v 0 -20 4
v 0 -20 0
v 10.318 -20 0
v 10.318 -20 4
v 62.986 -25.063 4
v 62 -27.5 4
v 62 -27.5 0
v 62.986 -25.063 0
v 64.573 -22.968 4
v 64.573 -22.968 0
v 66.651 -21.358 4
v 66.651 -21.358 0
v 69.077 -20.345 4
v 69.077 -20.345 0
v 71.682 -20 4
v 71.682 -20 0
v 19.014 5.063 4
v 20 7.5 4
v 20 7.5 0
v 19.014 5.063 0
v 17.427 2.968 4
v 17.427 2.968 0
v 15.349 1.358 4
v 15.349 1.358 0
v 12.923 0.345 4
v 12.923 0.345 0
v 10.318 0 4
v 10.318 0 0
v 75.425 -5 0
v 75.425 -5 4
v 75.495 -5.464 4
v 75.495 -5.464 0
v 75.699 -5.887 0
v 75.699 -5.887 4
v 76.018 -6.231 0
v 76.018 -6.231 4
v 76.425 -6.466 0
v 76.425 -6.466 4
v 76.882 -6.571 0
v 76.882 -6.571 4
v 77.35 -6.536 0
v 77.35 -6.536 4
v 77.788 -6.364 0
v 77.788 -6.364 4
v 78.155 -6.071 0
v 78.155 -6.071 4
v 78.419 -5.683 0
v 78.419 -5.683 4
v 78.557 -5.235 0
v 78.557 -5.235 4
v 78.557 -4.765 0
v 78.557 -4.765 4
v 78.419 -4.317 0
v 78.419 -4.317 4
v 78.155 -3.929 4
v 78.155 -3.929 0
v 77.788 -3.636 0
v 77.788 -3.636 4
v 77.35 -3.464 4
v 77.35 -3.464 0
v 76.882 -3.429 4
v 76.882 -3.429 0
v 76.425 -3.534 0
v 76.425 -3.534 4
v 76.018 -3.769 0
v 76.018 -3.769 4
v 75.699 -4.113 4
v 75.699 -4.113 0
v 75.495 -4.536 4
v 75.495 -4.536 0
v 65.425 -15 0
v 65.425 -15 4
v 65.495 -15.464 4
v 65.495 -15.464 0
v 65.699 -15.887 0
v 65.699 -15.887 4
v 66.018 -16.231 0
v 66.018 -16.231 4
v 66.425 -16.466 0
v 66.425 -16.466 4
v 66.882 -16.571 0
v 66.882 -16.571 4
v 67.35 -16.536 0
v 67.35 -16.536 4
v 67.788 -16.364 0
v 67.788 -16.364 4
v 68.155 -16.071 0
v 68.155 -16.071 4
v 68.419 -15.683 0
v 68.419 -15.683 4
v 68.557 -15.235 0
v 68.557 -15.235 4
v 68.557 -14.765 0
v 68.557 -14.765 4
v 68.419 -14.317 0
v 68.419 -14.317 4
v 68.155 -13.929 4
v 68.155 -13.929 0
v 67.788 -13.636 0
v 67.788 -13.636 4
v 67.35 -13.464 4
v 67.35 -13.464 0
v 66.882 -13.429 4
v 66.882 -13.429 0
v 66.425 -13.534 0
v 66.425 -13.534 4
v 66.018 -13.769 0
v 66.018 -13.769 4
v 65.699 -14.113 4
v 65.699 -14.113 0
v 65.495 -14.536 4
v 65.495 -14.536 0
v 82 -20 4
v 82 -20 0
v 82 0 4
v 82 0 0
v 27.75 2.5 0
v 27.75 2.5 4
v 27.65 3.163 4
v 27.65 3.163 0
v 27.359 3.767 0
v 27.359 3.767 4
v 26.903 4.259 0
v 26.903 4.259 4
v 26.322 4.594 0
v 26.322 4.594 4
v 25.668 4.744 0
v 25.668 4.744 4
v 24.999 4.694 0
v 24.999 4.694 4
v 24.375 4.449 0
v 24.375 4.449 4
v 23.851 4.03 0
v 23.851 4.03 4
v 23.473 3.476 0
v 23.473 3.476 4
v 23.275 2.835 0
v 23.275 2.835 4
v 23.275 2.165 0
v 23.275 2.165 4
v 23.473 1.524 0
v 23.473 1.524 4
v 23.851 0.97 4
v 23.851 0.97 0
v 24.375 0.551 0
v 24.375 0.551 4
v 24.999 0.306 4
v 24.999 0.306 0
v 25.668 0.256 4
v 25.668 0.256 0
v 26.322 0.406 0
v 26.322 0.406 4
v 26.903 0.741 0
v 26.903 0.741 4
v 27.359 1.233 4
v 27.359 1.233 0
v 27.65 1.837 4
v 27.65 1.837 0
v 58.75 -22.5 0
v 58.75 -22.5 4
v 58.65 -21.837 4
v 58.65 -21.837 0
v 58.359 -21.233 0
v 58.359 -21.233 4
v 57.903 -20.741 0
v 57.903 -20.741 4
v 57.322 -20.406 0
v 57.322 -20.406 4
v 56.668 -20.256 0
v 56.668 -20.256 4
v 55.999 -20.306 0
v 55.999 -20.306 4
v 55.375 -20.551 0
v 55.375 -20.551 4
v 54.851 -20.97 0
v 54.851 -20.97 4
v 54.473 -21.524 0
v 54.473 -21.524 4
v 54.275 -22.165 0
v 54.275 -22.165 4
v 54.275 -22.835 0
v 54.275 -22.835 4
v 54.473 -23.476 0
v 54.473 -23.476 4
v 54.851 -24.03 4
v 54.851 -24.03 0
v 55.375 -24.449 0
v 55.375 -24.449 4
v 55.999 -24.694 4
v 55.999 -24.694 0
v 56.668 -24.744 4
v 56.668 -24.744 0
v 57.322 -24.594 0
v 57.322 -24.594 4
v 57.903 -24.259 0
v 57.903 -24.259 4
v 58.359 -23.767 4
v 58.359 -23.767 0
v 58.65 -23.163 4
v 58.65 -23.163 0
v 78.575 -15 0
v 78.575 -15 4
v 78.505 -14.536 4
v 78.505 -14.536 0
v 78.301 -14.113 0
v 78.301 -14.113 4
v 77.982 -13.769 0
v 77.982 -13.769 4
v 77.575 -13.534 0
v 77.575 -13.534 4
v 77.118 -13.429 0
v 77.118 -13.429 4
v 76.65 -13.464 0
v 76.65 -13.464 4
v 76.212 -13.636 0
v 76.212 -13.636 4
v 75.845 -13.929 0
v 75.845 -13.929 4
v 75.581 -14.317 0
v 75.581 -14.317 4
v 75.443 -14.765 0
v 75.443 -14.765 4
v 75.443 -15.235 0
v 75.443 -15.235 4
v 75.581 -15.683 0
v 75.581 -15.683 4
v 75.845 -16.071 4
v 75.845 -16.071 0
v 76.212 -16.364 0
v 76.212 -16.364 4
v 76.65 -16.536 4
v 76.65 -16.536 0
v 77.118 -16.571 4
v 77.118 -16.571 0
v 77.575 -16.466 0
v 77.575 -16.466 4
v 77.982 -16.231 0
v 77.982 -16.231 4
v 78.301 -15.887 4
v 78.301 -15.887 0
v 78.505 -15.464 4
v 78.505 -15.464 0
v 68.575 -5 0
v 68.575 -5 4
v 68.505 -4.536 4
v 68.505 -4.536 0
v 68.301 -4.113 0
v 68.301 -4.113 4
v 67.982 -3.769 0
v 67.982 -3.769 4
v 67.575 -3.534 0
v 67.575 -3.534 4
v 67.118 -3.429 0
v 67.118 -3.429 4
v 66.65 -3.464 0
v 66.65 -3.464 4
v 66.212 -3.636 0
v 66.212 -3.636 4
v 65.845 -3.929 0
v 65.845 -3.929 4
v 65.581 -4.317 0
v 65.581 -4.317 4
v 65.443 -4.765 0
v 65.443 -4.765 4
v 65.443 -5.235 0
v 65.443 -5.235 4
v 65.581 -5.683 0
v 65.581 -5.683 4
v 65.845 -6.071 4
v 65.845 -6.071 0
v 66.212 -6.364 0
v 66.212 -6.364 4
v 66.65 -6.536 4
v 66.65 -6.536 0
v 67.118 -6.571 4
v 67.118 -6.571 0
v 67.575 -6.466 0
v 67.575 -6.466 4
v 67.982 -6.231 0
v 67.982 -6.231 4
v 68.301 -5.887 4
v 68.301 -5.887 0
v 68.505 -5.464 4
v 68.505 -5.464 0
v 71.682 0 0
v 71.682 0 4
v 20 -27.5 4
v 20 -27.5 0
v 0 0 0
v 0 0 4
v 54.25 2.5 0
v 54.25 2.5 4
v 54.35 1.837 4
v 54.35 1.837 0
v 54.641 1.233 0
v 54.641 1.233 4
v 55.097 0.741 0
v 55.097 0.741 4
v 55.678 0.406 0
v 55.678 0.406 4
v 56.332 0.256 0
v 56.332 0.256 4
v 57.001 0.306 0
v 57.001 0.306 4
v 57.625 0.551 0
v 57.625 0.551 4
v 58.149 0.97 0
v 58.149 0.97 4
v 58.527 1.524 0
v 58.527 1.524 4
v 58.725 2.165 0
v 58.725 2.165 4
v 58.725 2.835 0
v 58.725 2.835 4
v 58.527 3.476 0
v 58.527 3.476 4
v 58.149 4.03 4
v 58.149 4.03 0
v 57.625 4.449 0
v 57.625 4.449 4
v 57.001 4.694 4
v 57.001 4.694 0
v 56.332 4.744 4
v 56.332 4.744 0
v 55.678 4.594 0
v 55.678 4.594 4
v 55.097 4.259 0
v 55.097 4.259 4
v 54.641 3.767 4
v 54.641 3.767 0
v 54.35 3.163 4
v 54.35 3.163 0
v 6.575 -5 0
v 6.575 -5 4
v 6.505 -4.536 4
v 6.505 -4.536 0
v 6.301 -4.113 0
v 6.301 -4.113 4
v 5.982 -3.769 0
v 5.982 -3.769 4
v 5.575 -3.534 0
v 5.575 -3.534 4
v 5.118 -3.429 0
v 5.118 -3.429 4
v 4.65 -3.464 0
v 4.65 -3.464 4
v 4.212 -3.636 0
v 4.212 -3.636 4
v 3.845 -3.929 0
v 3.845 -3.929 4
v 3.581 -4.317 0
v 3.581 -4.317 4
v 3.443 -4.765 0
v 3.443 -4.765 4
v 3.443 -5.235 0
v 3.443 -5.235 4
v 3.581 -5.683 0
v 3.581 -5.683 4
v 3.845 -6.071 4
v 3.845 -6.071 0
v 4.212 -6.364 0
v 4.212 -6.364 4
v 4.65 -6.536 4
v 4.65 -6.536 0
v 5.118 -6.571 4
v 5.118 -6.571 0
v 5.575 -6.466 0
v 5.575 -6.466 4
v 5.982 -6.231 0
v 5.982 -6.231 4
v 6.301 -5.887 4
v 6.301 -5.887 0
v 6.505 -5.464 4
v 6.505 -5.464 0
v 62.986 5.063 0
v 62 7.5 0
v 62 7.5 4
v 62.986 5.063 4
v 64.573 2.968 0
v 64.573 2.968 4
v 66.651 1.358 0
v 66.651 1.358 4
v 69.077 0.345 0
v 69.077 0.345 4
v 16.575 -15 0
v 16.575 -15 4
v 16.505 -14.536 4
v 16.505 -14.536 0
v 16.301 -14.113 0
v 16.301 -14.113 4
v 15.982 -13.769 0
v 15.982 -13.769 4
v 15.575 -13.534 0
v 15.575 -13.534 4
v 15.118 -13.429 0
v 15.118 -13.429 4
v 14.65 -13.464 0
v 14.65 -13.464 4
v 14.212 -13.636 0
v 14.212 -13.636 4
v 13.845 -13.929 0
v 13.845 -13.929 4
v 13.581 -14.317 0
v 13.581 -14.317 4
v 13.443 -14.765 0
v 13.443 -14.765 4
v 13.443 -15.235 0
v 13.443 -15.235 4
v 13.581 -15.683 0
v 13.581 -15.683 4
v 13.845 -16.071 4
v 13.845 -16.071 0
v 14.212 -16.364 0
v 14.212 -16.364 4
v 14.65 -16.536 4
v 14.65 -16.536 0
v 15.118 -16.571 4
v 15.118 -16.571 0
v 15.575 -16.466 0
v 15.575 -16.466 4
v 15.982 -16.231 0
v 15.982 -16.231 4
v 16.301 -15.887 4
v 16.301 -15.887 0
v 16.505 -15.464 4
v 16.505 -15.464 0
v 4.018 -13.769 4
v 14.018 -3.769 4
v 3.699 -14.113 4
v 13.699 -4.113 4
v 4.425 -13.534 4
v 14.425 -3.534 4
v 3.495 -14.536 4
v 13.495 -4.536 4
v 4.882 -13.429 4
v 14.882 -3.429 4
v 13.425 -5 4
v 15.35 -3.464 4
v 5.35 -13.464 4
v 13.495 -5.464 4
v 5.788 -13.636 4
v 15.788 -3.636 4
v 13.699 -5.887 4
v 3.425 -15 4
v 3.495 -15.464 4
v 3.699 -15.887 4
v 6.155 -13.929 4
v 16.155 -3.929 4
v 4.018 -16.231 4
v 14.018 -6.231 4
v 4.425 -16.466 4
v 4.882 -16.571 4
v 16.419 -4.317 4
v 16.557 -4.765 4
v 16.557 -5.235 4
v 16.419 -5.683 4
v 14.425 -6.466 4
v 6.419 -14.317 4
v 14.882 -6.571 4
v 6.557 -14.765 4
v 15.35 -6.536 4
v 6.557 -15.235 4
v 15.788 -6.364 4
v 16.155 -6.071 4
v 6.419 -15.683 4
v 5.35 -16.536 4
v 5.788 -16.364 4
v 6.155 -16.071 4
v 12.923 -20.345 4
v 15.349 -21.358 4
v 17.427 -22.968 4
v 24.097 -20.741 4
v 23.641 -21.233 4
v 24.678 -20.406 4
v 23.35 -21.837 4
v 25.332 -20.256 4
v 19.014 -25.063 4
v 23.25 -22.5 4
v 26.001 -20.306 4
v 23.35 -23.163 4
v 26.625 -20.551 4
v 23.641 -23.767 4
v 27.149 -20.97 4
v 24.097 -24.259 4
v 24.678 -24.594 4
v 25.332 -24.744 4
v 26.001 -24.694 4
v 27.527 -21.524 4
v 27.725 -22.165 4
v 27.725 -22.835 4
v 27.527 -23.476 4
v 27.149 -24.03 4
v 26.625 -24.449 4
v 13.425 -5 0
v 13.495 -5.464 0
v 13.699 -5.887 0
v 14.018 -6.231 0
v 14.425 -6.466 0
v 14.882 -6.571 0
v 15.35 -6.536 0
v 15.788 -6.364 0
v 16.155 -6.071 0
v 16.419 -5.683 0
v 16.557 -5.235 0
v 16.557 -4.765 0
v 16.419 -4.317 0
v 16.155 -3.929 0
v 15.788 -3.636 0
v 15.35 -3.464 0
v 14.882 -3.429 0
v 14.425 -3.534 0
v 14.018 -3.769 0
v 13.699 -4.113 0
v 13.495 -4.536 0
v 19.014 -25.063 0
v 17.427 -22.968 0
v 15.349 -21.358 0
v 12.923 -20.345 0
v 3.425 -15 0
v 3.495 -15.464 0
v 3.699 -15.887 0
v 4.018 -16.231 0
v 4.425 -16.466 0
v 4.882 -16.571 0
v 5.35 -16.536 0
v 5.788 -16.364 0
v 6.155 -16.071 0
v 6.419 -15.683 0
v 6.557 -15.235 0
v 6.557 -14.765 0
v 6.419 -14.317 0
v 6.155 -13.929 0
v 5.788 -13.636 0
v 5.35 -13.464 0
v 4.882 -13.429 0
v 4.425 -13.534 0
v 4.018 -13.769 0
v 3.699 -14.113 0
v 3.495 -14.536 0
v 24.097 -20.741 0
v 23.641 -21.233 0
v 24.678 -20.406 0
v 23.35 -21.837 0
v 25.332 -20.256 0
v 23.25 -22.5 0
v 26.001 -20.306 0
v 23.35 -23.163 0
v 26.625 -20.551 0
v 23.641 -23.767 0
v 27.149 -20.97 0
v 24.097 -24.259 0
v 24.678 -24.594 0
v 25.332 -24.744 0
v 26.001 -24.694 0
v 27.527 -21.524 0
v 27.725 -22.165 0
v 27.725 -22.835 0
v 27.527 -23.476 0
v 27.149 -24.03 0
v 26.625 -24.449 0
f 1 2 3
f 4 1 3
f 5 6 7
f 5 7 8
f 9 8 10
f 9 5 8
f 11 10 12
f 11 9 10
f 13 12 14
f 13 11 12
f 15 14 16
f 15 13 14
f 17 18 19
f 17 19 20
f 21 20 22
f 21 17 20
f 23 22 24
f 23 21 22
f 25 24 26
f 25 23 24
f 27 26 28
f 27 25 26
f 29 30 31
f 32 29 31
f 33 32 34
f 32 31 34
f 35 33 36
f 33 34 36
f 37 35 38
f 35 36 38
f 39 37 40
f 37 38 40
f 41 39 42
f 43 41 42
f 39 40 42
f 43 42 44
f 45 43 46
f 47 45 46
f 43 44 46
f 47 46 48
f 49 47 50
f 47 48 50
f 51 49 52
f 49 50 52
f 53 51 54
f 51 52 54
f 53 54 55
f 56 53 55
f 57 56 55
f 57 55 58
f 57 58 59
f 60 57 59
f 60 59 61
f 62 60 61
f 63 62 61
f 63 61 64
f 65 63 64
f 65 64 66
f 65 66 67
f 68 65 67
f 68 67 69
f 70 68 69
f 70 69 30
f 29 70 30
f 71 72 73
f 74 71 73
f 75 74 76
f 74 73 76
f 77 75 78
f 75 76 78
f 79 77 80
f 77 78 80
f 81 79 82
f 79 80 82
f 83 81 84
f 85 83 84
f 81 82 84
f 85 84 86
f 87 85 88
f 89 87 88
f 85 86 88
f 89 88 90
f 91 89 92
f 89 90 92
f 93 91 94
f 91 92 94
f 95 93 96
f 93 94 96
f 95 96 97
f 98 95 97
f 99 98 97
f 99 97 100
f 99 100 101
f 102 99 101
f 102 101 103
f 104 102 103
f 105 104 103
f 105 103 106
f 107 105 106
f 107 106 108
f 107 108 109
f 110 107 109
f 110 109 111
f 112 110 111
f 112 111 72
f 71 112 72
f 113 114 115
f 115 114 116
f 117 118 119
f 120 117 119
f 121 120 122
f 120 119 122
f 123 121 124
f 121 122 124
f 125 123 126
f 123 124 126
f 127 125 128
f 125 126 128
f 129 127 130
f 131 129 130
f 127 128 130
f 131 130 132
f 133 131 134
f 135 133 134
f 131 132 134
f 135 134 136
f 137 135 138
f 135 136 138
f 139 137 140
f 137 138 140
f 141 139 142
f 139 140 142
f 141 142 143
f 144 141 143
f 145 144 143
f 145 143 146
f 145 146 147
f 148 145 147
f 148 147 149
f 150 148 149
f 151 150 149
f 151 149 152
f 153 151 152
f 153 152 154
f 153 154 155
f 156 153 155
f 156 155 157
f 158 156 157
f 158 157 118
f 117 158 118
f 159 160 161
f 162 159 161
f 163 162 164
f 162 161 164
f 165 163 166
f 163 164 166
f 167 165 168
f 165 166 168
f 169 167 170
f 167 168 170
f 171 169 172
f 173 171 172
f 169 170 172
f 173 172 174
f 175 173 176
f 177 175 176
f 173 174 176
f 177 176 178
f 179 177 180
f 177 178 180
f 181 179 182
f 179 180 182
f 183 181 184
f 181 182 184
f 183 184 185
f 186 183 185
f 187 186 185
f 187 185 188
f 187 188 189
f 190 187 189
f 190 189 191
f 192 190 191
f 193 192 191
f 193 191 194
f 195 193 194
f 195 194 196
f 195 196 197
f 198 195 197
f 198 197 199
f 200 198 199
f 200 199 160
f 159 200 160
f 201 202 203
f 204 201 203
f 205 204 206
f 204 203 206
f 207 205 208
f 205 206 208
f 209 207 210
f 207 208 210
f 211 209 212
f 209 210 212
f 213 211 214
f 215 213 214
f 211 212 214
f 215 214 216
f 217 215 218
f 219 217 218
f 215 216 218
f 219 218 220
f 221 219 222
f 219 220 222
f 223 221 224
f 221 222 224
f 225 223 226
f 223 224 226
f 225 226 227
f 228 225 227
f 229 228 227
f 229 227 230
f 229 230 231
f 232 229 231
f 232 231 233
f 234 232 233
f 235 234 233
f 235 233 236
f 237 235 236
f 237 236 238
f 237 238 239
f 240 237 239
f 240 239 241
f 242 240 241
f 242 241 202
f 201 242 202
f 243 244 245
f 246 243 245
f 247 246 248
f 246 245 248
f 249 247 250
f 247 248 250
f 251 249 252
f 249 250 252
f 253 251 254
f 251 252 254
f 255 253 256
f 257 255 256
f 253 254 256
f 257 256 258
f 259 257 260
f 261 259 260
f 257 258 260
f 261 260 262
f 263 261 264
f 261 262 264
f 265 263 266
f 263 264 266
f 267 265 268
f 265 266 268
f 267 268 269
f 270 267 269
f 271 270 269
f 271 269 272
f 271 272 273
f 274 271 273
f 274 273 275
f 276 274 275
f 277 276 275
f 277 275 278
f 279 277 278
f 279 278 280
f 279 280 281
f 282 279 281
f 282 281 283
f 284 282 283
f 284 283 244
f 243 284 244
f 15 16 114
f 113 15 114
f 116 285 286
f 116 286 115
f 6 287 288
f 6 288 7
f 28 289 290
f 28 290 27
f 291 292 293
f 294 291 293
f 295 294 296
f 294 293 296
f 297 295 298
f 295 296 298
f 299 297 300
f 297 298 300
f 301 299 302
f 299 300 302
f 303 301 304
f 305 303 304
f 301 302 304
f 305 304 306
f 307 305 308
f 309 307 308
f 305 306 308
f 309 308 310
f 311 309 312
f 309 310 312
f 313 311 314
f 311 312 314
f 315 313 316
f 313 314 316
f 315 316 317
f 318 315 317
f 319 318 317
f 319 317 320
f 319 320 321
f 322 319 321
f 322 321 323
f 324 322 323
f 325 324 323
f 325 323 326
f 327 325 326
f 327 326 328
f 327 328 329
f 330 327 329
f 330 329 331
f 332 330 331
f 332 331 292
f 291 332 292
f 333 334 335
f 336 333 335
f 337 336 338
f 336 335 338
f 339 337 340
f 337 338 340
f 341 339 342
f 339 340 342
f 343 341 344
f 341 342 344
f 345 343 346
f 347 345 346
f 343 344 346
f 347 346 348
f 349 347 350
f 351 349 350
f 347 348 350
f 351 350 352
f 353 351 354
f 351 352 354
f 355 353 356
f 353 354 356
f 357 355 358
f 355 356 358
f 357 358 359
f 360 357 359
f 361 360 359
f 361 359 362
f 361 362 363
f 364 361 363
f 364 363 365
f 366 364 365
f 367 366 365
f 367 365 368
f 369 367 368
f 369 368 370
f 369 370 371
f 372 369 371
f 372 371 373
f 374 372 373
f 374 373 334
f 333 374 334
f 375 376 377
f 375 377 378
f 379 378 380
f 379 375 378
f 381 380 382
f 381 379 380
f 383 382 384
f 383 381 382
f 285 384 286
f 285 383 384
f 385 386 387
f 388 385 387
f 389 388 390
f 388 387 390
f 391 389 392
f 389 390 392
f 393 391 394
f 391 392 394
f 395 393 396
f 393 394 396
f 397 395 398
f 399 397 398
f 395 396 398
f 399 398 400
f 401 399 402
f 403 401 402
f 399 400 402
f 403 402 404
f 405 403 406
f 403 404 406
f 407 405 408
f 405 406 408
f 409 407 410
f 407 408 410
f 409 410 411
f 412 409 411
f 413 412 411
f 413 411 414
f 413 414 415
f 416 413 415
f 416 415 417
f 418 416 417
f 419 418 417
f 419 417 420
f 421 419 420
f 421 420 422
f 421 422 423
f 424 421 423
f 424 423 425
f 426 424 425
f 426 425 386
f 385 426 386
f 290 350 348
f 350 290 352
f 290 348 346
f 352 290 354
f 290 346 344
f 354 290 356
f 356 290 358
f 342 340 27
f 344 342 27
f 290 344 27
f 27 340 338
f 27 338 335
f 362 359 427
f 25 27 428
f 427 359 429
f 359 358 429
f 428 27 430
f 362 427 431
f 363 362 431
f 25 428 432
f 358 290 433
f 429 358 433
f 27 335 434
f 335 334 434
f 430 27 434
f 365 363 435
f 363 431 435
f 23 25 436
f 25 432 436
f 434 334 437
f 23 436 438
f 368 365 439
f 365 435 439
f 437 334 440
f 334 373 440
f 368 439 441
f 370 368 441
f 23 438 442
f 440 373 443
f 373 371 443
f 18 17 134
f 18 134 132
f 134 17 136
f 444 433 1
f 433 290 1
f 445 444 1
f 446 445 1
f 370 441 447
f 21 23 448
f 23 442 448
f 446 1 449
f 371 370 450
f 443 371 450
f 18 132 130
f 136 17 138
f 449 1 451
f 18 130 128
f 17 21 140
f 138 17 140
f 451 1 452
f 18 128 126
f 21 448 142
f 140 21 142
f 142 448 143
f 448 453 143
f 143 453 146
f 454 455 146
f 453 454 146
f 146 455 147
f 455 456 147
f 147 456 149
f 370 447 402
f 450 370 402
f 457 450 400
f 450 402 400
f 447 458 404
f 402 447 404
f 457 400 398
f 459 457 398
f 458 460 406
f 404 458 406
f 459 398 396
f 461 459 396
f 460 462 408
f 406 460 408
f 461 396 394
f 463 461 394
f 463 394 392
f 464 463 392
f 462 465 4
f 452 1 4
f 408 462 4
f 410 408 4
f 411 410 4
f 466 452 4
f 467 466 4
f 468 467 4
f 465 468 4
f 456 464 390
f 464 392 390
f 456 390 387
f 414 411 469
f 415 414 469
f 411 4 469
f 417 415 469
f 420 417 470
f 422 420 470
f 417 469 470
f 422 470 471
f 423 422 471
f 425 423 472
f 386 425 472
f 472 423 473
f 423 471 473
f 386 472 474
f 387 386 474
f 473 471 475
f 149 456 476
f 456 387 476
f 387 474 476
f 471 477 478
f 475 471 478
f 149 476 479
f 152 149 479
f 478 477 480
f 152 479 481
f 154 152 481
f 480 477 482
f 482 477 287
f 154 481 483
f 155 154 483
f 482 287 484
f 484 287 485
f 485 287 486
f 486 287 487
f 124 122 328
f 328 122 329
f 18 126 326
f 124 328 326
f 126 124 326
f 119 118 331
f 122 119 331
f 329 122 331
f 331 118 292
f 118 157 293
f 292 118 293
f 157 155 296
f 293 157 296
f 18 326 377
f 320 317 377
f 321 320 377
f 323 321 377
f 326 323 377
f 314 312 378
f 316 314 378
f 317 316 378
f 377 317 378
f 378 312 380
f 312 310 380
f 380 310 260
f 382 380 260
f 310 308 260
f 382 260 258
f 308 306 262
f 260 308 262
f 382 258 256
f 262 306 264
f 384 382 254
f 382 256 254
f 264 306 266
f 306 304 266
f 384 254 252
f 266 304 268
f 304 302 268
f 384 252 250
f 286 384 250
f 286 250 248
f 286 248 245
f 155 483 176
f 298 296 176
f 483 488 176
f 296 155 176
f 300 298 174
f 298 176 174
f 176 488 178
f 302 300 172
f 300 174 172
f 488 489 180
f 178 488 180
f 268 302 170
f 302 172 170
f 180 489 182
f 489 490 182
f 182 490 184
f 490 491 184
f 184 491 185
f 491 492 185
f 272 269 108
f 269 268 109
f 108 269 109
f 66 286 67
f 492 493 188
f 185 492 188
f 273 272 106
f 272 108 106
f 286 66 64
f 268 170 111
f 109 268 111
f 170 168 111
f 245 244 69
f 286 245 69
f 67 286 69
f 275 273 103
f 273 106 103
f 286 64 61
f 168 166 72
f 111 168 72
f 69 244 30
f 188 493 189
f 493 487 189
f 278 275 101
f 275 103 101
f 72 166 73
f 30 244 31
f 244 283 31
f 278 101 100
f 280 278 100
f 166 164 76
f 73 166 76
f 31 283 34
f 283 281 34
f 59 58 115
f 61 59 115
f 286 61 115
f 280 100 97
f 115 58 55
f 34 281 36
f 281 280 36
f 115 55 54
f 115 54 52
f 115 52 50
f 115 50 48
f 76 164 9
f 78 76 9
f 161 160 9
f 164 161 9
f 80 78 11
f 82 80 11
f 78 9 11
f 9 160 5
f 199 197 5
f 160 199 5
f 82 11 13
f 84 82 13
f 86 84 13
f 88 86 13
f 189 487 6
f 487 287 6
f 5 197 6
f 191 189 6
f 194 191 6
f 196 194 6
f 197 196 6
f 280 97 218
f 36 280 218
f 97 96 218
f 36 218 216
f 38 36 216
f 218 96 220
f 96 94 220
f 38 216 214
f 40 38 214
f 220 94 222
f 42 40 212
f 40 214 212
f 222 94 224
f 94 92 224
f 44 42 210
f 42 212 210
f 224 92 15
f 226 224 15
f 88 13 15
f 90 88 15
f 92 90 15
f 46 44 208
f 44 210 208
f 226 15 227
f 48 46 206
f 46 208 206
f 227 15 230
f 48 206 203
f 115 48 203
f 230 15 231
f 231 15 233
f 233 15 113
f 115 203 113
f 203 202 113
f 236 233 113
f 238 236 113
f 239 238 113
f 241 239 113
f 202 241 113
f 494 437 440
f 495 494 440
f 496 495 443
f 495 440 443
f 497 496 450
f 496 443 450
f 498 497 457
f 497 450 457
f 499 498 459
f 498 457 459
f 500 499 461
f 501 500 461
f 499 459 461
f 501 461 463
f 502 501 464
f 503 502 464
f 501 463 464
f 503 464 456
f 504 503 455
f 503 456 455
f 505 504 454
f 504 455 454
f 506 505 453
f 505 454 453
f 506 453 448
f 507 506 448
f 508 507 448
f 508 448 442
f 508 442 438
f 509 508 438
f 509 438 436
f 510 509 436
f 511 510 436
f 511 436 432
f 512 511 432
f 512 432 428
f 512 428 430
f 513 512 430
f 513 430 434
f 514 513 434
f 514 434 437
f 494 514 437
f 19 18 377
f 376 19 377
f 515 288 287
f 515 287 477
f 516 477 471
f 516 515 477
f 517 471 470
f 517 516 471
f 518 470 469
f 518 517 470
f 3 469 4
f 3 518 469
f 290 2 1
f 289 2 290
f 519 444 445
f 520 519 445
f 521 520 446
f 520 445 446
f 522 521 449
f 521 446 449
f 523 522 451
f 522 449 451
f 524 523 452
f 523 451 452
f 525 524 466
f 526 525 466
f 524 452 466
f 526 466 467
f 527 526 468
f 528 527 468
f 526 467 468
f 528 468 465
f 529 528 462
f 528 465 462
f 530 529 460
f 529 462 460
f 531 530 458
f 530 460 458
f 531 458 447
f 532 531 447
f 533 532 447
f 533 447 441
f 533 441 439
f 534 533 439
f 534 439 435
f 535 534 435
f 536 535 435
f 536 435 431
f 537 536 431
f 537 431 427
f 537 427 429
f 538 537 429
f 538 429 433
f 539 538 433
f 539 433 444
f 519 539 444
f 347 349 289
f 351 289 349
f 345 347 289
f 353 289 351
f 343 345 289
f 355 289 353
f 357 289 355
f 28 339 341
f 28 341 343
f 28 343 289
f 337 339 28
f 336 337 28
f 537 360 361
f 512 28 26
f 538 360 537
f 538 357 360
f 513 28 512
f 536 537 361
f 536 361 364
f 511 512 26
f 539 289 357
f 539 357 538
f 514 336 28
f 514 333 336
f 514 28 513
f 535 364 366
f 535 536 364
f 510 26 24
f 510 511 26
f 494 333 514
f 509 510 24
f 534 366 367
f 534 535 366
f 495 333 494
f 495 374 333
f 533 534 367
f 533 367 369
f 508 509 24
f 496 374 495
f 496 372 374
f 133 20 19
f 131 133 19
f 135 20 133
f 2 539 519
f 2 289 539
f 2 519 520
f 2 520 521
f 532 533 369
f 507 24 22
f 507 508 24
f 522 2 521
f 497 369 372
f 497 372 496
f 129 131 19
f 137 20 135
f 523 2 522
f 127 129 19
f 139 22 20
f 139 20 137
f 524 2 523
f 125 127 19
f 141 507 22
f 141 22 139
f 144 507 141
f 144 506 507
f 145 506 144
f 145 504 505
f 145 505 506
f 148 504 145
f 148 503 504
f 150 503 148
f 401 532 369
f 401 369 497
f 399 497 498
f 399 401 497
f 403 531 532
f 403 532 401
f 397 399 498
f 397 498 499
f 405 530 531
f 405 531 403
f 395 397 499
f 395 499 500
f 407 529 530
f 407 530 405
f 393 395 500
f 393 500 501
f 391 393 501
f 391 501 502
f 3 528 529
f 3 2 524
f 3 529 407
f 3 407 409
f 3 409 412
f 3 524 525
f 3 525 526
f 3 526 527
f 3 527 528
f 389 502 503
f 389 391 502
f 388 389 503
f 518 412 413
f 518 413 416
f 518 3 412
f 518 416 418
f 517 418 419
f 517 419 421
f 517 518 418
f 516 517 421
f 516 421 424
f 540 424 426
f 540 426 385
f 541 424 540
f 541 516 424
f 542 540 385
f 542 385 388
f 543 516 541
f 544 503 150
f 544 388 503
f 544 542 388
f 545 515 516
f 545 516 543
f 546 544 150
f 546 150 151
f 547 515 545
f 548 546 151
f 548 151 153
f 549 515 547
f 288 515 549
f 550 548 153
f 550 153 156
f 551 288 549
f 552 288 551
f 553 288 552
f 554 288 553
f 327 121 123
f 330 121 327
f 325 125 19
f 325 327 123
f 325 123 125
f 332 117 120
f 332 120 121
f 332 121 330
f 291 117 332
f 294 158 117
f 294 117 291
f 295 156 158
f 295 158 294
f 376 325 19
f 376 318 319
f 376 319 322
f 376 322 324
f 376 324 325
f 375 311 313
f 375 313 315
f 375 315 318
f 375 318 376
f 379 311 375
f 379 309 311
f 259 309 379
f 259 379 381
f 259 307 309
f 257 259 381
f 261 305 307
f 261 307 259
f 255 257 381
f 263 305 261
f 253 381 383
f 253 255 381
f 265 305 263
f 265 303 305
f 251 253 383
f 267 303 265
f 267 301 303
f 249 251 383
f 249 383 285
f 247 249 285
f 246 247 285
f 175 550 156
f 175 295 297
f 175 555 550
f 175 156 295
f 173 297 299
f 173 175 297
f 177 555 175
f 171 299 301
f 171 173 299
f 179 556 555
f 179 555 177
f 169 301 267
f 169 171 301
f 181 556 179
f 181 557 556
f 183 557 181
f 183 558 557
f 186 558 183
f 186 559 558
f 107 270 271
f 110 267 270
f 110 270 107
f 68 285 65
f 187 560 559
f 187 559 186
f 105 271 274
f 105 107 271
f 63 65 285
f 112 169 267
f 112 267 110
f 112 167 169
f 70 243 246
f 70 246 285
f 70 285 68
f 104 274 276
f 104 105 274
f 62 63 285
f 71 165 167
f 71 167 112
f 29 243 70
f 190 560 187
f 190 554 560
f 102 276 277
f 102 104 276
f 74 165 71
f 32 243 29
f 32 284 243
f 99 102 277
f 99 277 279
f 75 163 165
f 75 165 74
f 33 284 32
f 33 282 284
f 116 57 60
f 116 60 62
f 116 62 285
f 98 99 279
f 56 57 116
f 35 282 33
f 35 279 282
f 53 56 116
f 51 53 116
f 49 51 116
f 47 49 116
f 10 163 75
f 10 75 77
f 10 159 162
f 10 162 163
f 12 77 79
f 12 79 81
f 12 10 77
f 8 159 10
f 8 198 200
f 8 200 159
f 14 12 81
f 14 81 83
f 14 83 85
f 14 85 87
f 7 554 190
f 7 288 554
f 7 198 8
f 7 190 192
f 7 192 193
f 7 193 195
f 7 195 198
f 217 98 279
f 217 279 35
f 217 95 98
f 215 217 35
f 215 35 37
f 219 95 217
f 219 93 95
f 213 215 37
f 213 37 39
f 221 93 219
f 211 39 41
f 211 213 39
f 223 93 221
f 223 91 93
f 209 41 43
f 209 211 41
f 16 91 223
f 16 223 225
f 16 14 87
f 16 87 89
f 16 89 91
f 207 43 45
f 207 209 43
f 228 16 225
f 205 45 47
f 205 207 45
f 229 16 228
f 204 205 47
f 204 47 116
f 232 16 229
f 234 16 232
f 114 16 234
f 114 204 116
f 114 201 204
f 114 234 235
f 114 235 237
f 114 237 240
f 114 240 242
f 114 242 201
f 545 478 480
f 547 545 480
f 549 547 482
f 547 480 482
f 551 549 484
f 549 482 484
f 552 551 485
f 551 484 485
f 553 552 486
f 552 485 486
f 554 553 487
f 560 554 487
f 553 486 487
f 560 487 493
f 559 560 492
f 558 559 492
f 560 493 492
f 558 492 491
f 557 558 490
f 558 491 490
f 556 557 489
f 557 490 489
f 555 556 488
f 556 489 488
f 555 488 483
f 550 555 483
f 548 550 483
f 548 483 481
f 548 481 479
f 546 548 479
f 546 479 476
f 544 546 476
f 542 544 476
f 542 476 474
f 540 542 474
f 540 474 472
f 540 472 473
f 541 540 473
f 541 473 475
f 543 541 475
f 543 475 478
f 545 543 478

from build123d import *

# Parameters (mm, degrees)
SKETCH_1_W          = 82
SKETCH_1_H          = 20
EXTRUDE_1_DEPTH     = 4
SKETCH_2_W          = 42
SKETCH_2_H          = 35
EXTRUDE_2_DEPTH     = 4
SKETCH_3_R          = 1.575
SKETCH_3_R_2        = 2.25
CUT_EXTRUDE_1_DEPTH = 87.580887036
FILLET_1_R          = 10


with BuildPart() as part:
    # 草图1 → 凸台-拉伸1 (new body)
    with BuildSketch(Plane.XY):
        with Locations((41, -10)):
            Rectangle(SKETCH_1_W, SKETCH_1_H)
    extrude(amount=EXTRUDE_1_DEPTH)

    # 草图2 → 凸台-拉伸2 (add)
    with BuildSketch(Plane.XY.offset(4)):
        with Locations((41, -10)):
            Rectangle(SKETCH_2_W, SKETCH_2_H)
    extrude(amount=-EXTRUDE_2_DEPTH)

    # 草图3 → 切除-拉伸1 (cut, through all)
    with BuildSketch(Plane.XY.offset(4)):
        with Locations((5, -5)):
            Circle(SKETCH_3_R)
        with Locations(Location((15, -5, 0), (0, 0, 180))):
            Circle(SKETCH_3_R)
        with Locations((15, -15)):
            Circle(SKETCH_3_R)
        with Locations(Location((5, -15, 0), (0, 0, 180))):
            Circle(SKETCH_3_R)
        with Locations((77, -15)):
            Circle(SKETCH_3_R)
        with Locations(Location((67, -15, 0), (0, 0, 180))):
            Circle(SKETCH_3_R)
        with Locations((67, -5)):
            Circle(SKETCH_3_R)
        with Locations(Location((77, -5, 0), (0, 0, 180))):
            Circle(SKETCH_3_R)
        with Locations((25.5, 2.5)):
            Circle(SKETCH_3_R_2)
        with Locations(Location((56.5, 2.5, 0), (0, 0, 180))):
            Circle(SKETCH_3_R_2)
        with Locations((56.5, -22.5)):
            Circle(SKETCH_3_R_2)
        with Locations(Location((25.5, -22.5, 0), (0, 0, 180))):
            Circle(SKETCH_3_R_2)
    extrude(amount=-CUT_EXTRUDE_1_DEPTH, mode=Mode.SUBTRACT)

    # 圆角1
    # the kernel refuses this fillet: 10 mm, written as the material it adds along each edge
    with BuildSketch(Plane(origin=(62, -20, 4), x_dir=(0, -1, 0), z_dir=(0, 0, -1)), Plane(origin=(62, 0, 0), x_dir=(0, 1, 0), z_dir=(0, 0, 1))) as fillet_1_piece_1:
        with BuildLine():
            CenterArc((10, -9.682458366), FILLET_1_R, 104.477512186, 75.522487814)
            Line((0, -9.682458366), (-0.2, -9.682458366))
            Line((-0.2, -9.682458366), (-0.2, 0))
            Line((-0.2, 0), (0, 0.2))
            ThreePointArc((0, 0.2), (3.75, 0.2), (7.45, 0.193649167))
            Line((7.45, 0.193649167), (7.5, 0))
        make_face()
    extrude(amount=4)
    with BuildSketch(Plane(origin=(20, -20, 0), x_dir=(-1, 0, 0), z_dir=(0, 0, 1)), Plane(origin=(20, 0, 4), x_dir=(-1, 0, 0), z_dir=(0, 0, -1))) as fillet_1_piece_2:
        with BuildLine():
            CenterArc((9.682458366, 10), FILLET_1_R, 194.477512186, 75.522487814)
            Line((0, 7.5), (-0.193649167, 7.45))
            ThreePointArc((-0.193649167, 7.45), (-0.2, 3.75), (-0.2, 0))
            Line((-0.2, 0), (0, -0.2))
            Line((0, -0.2), (9.682458366, -0.2))
            Line((9.682458366, -0.2), (9.682458366, 0))
        make_face()
    extrude(amount=4)


solid = part.part
